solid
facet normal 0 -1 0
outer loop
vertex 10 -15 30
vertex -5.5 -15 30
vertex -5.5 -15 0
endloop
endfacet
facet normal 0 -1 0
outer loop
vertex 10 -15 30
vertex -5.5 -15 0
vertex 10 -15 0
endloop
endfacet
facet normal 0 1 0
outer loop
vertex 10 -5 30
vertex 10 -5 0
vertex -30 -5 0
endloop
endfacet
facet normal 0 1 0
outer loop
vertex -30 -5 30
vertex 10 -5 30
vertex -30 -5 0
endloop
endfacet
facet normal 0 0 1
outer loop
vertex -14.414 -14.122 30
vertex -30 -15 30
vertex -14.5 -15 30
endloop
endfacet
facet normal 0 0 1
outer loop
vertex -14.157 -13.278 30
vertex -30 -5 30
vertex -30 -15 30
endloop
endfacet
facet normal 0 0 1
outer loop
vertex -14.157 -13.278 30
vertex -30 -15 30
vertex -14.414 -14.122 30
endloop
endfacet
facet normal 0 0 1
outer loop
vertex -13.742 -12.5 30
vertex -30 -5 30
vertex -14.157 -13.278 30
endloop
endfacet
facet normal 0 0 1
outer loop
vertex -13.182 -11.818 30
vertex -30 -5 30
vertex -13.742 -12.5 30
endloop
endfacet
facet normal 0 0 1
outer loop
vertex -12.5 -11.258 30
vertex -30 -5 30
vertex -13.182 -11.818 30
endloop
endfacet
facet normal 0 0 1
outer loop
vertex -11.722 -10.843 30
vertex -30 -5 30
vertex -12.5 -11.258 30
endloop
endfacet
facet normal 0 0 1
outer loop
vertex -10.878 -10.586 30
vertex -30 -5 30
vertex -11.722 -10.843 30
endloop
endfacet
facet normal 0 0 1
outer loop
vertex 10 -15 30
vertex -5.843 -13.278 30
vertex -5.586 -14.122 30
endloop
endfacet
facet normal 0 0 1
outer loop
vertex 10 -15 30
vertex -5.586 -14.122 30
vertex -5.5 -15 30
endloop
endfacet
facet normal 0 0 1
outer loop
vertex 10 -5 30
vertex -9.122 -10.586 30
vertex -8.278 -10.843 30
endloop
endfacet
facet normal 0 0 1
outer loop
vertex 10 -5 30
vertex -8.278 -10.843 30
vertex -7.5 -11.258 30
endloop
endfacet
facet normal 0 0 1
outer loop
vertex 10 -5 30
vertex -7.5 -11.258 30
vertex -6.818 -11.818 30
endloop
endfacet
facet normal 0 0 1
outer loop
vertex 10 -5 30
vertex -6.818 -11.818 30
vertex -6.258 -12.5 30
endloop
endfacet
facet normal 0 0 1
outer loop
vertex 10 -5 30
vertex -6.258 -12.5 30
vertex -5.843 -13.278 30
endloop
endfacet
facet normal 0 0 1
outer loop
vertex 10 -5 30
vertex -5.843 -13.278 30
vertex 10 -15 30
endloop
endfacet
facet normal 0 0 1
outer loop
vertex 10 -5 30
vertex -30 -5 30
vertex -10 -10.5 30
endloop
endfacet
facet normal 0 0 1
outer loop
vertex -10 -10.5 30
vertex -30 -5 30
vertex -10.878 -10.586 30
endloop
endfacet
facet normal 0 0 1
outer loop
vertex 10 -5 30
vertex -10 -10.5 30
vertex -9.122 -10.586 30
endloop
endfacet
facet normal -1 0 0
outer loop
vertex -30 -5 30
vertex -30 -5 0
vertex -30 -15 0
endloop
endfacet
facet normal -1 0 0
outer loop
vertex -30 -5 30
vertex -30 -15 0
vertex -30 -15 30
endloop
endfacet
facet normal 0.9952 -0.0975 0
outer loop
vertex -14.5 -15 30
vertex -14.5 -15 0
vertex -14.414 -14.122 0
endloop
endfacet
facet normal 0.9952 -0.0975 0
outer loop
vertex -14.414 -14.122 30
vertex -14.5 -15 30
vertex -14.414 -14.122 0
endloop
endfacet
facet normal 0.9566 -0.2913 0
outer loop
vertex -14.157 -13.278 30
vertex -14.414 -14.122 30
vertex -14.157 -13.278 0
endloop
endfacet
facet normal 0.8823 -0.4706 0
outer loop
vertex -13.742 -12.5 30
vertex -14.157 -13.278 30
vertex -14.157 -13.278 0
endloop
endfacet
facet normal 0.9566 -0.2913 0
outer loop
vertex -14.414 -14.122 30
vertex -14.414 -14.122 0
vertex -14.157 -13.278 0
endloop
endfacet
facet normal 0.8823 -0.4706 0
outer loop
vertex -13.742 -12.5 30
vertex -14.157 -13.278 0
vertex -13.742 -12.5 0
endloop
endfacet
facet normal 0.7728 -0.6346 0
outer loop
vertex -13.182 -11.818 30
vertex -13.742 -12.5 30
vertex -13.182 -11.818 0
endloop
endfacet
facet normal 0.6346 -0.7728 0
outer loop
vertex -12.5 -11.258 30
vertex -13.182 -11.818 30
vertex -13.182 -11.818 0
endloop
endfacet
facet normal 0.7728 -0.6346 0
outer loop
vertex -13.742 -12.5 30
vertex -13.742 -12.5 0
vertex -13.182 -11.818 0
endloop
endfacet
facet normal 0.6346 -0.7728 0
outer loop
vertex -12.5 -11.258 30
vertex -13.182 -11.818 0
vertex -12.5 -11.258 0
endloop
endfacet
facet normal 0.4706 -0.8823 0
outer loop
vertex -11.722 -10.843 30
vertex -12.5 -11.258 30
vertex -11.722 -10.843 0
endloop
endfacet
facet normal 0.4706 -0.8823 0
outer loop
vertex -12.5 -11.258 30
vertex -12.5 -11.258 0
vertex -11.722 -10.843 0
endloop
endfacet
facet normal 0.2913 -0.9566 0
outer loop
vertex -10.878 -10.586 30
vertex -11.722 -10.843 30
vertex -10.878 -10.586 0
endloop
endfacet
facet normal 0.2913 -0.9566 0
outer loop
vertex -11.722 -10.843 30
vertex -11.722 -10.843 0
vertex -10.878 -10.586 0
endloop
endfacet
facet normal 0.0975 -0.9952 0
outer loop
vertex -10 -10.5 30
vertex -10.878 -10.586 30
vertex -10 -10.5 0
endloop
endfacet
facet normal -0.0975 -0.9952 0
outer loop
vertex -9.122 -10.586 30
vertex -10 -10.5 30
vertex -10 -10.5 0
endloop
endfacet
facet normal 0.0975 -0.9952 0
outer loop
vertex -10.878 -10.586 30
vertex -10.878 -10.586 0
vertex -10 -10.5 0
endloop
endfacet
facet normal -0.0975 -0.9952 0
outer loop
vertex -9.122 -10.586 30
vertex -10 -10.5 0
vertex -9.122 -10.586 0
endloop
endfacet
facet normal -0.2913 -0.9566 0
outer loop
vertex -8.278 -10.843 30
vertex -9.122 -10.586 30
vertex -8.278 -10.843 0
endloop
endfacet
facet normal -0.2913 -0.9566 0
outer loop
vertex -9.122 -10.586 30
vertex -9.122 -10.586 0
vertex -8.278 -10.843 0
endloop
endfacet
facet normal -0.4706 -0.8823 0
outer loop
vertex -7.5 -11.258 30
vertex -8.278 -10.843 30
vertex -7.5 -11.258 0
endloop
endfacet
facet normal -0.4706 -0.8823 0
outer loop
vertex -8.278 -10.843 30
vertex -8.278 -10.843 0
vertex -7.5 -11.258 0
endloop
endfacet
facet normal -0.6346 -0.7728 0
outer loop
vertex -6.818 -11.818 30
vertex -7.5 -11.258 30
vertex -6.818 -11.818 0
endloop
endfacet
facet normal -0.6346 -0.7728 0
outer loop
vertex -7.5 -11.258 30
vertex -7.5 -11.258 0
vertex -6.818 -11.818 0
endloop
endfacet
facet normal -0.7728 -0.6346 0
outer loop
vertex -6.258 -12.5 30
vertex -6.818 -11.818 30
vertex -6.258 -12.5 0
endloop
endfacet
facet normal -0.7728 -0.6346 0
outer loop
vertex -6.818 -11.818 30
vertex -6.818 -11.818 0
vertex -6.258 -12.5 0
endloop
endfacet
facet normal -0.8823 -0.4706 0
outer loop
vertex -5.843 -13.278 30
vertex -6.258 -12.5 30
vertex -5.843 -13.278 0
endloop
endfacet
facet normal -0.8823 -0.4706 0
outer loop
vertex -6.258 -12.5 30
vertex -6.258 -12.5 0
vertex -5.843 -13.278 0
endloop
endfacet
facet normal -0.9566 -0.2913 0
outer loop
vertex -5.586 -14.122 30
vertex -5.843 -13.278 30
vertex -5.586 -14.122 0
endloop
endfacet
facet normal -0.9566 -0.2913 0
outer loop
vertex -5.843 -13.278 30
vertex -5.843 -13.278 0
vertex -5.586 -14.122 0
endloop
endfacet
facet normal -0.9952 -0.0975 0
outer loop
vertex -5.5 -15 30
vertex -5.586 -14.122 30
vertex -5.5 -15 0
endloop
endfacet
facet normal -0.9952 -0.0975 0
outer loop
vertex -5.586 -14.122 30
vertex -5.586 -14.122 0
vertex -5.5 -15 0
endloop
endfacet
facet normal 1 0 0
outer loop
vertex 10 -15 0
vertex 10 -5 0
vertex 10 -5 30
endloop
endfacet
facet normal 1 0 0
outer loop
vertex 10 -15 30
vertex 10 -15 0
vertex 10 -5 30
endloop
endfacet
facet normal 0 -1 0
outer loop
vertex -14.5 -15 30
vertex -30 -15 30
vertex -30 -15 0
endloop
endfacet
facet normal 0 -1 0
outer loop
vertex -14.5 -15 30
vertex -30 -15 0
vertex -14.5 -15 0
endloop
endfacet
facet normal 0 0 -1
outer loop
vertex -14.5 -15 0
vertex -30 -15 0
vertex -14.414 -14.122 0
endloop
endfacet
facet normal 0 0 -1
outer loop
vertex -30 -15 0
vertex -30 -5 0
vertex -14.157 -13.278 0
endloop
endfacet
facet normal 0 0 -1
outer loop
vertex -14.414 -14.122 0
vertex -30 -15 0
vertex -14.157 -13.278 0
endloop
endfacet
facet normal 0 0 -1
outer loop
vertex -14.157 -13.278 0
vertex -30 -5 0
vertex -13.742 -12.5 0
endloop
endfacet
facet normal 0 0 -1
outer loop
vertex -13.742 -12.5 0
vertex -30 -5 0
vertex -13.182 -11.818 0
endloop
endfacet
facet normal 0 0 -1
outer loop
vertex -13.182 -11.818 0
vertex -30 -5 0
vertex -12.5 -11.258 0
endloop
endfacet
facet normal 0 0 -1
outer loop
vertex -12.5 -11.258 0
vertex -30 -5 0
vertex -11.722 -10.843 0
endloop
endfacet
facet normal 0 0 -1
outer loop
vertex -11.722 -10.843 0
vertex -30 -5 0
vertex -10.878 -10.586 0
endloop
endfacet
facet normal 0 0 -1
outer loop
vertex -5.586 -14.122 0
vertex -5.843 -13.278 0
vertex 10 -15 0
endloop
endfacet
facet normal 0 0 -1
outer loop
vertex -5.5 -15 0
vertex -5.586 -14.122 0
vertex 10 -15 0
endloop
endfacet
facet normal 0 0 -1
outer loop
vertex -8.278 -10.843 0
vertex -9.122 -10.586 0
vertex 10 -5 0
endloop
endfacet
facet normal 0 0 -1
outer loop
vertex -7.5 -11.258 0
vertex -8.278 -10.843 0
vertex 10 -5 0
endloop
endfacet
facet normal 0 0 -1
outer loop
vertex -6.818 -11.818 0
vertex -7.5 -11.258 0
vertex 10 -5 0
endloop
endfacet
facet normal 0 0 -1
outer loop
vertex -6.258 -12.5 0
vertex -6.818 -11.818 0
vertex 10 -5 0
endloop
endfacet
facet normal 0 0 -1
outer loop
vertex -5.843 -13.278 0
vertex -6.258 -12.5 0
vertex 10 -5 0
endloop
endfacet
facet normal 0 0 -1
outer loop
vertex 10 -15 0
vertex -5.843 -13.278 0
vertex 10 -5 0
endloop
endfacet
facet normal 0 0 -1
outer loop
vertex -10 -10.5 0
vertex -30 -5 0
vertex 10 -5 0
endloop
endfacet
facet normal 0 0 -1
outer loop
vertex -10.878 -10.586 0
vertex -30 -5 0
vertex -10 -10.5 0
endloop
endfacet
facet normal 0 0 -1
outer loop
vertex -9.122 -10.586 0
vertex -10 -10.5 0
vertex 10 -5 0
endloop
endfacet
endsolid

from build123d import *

# Parameters (mm, degrees)
ESQUISSE1_W             = 20
ESQUISSE1_H             = 30
BOSS_EXTRU_1_DEPTH      = 10
ESQUISSE2_R             = 6
BOSS_EXTRU_2_DEPTH      = 40
ESQUISSE3_W             = 40
ESQUISSE3_H             = 30
BOSS_EXTRU_3_DEPTH      = 15
ESQUISSE4_R             = 4.5
ENL_V_MAT_EXTRU_1_DEPTH = 55
ENL_V_MAT_EXTRU_3_DEPTH = 55
ESQUISSE8_W             = 40.266643215
ESQUISSE8_H             = 36.212285802
ENL_V_MAT_EXTRU_4_DEPTH = 55


with BuildPart() as part:
    # Esquisse1 → Boss.-Extru.1 (new body)
    with BuildSketch(Plane.XY):
        with Locations((-10, 15)):
            Rectangle(ESQUISSE1_W, ESQUISSE1_H)
    extrude(amount=BOSS_EXTRU_1_DEPTH)

    # Esquisse2 → Boss.-Extru.2 (add)
    with BuildSketch(Plane.XY.offset(10)):
        with Locations((-10, 18)):
            Circle(ESQUISSE2_R)
    extrude(amount=BOSS_EXTRU_2_DEPTH)

    # Esquisse3 → Boss.-Extru.3 (add)
    with BuildSketch(Plane.XZ):
        with Locations((-10, 15)):
            Rectangle(ESQUISSE3_W, ESQUISSE3_H)
    extrude(amount=BOSS_EXTRU_3_DEPTH)

    # Esquisse4 → Enlèv. mat.-Extru.1 (cut)
    with BuildSketch(Plane(origin=(0, 0, 0), x_dir=(-1, 0, 0), z_dir=(0, 0, -1))):
        with Locations((10, -15)):
            Circle(ESQUISSE4_R)
    extrude(amount=-ENL_V_MAT_EXTRU_1_DEPTH, mode=Mode.SUBTRACT)

    # Esquisse5 → Enlèv. mat.-Extru.3 (cut)
    with BuildSketch(Plane(origin=(0, 0, 0), x_dir=(-1, 0, 0), z_dir=(0, 0, -1))):
        with BuildLine():
            Line((30, 0), (25, 0))
            ThreePointArc((25, 0), (28.535533906, -1.464466094), (30, -5))
            Line((30, -5), (30, 0))
        make_face()
        with BuildLine():
            Line((-10, 0), (-10, -5))
            ThreePointArc((-10, -5), (-8.535533906, -1.464466094), (-5, 0))
            Line((-5, 0), (-10, 0))
        make_face()
    extrude(amount=-ENL_V_MAT_EXTRU_3_DEPTH, mode=Mode.SUBTRACT)

    # Esquisse8 → Enlèv. mat.-Extru.4 (cut)
    with BuildSketch(Plane(origin=(0, 0, 0), x_dir=(-1, 0, 0), z_dir=(0, 0, -1))):
        with Locations((10.133321608, 13.106142901)):
            Rectangle(ESQUISSE8_W, ESQUISSE8_H)
    extrude(amount=-ENL_V_MAT_EXTRU_4_DEPTH, mode=Mode.SUBTRACT)


solid = part.part
